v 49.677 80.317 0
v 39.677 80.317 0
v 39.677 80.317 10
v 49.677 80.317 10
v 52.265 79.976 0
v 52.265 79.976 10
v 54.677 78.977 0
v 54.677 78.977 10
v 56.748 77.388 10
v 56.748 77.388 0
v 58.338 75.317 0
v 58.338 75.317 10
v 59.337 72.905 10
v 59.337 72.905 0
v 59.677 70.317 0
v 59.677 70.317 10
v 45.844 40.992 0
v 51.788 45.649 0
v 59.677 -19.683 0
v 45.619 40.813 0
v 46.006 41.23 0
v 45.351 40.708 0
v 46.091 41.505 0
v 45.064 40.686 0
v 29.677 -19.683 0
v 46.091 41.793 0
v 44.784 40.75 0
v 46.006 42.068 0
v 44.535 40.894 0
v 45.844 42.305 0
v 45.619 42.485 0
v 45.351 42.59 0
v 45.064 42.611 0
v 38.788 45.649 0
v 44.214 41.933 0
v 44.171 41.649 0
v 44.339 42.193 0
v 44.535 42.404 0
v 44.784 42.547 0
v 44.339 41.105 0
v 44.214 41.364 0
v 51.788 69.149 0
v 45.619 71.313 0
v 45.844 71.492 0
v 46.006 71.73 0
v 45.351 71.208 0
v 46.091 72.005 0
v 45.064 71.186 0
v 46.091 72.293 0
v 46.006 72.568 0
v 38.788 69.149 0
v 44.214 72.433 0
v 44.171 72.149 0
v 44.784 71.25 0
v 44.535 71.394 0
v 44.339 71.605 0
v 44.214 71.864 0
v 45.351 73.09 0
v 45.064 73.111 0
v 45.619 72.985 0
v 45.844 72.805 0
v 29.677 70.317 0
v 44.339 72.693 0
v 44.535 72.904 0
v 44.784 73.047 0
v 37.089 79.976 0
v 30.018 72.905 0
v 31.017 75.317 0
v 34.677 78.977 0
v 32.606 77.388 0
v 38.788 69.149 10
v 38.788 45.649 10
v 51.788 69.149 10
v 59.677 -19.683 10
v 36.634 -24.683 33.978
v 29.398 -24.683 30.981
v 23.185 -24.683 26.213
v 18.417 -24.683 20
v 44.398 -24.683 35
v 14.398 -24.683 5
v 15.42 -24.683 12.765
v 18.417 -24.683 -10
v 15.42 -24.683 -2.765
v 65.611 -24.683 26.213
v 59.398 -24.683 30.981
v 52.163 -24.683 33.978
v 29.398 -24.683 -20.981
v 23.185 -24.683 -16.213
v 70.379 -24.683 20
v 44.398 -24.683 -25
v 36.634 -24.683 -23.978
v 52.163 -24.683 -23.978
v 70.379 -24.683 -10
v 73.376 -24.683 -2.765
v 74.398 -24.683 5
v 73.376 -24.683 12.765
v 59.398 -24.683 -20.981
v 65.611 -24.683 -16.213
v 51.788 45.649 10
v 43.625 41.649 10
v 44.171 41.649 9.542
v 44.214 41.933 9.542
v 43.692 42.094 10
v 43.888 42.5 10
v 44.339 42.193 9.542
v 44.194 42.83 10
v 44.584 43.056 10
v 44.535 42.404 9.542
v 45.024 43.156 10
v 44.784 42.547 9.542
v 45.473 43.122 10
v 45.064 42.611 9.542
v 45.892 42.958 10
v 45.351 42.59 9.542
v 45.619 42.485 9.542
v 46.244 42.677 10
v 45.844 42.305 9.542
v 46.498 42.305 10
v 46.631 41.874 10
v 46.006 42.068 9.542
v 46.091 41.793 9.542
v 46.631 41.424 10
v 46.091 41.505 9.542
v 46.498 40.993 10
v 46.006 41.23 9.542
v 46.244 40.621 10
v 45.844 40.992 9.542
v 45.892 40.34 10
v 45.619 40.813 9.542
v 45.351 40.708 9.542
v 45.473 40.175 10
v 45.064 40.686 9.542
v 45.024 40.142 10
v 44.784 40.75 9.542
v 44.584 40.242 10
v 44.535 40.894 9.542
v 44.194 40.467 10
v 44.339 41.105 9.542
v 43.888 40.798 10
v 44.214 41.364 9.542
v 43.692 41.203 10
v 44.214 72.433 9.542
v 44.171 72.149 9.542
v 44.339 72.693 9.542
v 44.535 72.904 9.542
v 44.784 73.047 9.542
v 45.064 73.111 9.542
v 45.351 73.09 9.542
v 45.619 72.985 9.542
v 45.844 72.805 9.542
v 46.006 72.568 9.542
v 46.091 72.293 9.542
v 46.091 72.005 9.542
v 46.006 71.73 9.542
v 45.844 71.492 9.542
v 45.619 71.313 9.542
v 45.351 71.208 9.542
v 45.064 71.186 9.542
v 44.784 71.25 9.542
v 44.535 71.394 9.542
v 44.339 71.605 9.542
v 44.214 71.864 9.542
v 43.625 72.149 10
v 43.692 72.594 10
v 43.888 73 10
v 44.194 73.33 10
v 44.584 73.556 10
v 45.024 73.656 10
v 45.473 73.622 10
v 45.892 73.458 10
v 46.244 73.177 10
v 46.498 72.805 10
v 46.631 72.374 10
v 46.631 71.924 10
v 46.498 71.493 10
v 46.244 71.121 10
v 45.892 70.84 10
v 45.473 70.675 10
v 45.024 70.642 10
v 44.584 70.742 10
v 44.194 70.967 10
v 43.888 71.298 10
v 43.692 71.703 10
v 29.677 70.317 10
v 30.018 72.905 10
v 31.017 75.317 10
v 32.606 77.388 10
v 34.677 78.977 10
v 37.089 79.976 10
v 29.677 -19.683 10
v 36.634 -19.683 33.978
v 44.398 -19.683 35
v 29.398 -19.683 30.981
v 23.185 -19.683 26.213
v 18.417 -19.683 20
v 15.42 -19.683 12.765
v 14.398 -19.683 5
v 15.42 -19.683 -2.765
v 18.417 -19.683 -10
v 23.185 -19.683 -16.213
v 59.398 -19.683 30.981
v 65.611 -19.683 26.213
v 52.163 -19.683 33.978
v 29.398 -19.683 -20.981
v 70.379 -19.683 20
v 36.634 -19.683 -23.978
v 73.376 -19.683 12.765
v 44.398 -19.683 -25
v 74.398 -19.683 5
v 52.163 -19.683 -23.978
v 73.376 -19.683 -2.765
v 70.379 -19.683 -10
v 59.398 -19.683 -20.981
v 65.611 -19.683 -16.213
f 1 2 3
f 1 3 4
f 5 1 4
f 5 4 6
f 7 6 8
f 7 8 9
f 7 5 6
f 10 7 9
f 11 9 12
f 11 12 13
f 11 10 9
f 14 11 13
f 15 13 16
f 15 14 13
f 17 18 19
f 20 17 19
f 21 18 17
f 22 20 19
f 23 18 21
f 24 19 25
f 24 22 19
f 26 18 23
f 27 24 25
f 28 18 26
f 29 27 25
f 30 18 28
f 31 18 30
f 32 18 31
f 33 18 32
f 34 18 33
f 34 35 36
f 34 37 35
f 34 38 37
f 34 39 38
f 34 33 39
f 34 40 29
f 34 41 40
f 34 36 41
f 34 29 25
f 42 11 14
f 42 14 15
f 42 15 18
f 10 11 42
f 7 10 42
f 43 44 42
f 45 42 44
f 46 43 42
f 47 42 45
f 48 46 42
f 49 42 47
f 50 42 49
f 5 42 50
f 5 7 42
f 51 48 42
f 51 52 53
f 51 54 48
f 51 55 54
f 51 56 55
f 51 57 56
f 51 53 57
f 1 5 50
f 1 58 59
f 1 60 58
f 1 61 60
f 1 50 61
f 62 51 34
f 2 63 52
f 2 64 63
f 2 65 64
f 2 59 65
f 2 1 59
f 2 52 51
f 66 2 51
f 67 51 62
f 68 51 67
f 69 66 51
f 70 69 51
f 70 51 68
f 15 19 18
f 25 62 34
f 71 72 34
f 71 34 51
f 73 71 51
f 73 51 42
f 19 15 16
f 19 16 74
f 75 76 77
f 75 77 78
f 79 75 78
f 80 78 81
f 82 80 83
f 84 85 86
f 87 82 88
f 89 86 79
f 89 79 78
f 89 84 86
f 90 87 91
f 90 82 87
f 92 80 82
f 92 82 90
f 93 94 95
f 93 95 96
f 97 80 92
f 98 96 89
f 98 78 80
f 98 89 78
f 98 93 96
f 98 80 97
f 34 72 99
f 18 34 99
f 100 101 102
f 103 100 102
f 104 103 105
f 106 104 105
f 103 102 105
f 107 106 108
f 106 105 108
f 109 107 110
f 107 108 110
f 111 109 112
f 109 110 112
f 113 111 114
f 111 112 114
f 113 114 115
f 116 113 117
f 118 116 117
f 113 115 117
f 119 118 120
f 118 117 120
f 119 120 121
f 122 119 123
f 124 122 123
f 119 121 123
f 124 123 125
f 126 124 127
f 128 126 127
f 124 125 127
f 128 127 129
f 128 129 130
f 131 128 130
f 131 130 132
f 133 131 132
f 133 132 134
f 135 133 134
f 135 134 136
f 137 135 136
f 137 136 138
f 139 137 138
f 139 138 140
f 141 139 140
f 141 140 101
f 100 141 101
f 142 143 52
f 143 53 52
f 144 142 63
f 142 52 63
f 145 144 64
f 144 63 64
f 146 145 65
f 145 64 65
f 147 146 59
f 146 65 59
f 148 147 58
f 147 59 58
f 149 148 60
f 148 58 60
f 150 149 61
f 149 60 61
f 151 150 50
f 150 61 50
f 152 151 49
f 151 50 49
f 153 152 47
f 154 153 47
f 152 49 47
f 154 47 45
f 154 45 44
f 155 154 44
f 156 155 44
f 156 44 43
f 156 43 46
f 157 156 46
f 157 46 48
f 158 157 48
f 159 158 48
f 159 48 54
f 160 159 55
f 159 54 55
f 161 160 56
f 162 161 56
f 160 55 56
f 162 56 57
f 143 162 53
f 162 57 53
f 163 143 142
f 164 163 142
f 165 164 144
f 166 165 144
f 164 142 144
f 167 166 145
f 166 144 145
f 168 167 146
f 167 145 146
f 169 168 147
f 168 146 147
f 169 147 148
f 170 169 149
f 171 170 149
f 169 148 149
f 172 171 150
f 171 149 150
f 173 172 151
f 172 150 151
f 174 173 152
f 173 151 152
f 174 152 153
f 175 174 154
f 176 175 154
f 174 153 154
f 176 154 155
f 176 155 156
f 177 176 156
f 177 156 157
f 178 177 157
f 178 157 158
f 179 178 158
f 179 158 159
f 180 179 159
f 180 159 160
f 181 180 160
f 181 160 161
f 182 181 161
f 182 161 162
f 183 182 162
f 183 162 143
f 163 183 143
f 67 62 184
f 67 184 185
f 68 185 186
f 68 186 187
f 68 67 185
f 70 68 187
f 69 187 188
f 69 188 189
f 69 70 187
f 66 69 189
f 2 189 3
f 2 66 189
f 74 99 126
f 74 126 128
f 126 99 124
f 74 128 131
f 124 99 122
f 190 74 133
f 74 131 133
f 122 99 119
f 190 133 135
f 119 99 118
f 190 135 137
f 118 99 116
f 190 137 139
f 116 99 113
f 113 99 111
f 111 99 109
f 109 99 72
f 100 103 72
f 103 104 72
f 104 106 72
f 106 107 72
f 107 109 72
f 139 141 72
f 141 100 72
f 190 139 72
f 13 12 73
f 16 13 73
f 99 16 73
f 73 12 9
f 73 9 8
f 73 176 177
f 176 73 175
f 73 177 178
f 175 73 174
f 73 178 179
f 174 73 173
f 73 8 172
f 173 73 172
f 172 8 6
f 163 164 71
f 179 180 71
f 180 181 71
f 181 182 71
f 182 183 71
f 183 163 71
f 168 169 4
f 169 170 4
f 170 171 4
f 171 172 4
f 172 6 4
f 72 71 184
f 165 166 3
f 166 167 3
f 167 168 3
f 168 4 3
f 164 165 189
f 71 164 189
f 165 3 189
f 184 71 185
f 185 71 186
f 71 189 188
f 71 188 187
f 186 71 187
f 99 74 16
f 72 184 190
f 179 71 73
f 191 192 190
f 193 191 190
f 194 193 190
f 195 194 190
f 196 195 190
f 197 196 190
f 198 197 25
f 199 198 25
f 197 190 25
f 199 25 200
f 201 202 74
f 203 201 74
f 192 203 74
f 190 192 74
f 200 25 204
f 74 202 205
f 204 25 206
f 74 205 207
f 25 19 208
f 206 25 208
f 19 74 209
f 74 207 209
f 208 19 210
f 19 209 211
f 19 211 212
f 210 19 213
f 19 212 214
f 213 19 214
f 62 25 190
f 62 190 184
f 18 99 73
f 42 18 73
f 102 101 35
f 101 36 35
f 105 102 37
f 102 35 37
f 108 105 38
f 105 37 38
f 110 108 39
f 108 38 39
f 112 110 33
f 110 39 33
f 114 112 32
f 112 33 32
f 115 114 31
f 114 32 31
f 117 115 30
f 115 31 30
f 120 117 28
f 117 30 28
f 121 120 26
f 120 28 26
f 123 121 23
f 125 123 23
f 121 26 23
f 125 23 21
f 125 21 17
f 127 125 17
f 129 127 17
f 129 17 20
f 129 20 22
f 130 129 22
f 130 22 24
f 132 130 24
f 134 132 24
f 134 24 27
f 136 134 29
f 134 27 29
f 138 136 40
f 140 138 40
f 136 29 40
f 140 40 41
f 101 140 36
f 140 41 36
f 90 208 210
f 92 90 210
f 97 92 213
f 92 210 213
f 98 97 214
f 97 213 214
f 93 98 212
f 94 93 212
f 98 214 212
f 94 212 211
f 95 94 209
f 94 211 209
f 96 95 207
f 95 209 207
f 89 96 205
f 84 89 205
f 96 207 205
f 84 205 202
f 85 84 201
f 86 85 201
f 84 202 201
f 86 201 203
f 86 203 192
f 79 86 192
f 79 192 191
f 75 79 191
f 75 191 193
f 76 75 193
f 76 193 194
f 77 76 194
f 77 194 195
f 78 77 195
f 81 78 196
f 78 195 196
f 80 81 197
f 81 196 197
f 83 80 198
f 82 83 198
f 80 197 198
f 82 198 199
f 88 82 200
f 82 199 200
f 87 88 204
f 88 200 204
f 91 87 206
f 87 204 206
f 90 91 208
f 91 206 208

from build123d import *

# Parameters (mm, degrees)
BOSS_EXTRUDE1_DEPTH                               = 10
SKETCH6_W                                         = 13
SKETCH6_H                                         = 23.5
CUT_EXTRUDE1_DEPTH                                = 101.559411442
CSK_FOR_0_FLAT_HEAD_MACHINE_SCREW_100_D           = 1.9304
CSK_FOR_0_FLAT_HEAD_MACHINE_SCREW_100_CSINK_D     = 3.0226
CSK_FOR_0_FLAT_HEAD_MACHINE_SCREW_100_CSINK_ANGLE = 100
SKETCH15_R                                        = 30
BOSS_EXTRUDE2_DEPTH                               = 5


with BuildPart() as part:
    # Sketch4 → Boss-Extrude1 (new body)
    with BuildSketch(Plane.XY):
        with BuildLine():
            Line((39.677308084, 80.316960409), (49.677308084, 80.316960409))
            ThreePointArc((49.677308084, 80.316960409), (56.748375896, 77.388028221), (59.677308084, 70.316960409))
            Line((59.677308084, 70.316960409), (59.677308084, -19.683039591))
            Line((59.677308084, -19.683039591), (29.677308084, -19.683039591))
            Line((29.677308084, -19.683039591), (29.677308084, 70.316960409))
            ThreePointArc((29.677308084, 70.316960409), (32.606240272, 77.388028221), (39.677308084, 80.316960409))
        make_face()
    extrude(amount=BOSS_EXTRUDE1_DEPTH)

    # Sketch6 → Cut-Extrude1 (cut, through all)
    with BuildSketch(Plane.XY.offset(10)):
        with Locations((45.288344904, 57.398882655)):
            Rectangle(SKETCH6_W, SKETCH6_H)
    extrude(amount=-CUT_EXTRUDE1_DEPTH, mode=Mode.SUBTRACT)

    # CSK for #0 Flat Head Machine Screw (100)2 (through all)
    with Locations(Plane.XY.offset(10)):
        with Locations((45.136449354, 72.148882655), (45.136449354, 41.648882655)):
            CounterSinkHole(CSK_FOR_0_FLAT_HEAD_MACHINE_SCREW_100_D / 2, CSK_FOR_0_FLAT_HEAD_MACHINE_SCREW_100_CSINK_D / 2, counter_sink_angle=CSK_FOR_0_FLAT_HEAD_MACHINE_SCREW_100_CSINK_ANGLE)

    # Sketch15 → Boss-Extrude2 (add)
    with BuildSketch(Plane.XZ.offset(19.683039591)):
        with Locations(Location((44.398165665, 5, 0), (0, 0, 270))):
            Circle(SKETCH15_R)
    extrude(amount=BOSS_EXTRUDE2_DEPTH)


solid = part.part
